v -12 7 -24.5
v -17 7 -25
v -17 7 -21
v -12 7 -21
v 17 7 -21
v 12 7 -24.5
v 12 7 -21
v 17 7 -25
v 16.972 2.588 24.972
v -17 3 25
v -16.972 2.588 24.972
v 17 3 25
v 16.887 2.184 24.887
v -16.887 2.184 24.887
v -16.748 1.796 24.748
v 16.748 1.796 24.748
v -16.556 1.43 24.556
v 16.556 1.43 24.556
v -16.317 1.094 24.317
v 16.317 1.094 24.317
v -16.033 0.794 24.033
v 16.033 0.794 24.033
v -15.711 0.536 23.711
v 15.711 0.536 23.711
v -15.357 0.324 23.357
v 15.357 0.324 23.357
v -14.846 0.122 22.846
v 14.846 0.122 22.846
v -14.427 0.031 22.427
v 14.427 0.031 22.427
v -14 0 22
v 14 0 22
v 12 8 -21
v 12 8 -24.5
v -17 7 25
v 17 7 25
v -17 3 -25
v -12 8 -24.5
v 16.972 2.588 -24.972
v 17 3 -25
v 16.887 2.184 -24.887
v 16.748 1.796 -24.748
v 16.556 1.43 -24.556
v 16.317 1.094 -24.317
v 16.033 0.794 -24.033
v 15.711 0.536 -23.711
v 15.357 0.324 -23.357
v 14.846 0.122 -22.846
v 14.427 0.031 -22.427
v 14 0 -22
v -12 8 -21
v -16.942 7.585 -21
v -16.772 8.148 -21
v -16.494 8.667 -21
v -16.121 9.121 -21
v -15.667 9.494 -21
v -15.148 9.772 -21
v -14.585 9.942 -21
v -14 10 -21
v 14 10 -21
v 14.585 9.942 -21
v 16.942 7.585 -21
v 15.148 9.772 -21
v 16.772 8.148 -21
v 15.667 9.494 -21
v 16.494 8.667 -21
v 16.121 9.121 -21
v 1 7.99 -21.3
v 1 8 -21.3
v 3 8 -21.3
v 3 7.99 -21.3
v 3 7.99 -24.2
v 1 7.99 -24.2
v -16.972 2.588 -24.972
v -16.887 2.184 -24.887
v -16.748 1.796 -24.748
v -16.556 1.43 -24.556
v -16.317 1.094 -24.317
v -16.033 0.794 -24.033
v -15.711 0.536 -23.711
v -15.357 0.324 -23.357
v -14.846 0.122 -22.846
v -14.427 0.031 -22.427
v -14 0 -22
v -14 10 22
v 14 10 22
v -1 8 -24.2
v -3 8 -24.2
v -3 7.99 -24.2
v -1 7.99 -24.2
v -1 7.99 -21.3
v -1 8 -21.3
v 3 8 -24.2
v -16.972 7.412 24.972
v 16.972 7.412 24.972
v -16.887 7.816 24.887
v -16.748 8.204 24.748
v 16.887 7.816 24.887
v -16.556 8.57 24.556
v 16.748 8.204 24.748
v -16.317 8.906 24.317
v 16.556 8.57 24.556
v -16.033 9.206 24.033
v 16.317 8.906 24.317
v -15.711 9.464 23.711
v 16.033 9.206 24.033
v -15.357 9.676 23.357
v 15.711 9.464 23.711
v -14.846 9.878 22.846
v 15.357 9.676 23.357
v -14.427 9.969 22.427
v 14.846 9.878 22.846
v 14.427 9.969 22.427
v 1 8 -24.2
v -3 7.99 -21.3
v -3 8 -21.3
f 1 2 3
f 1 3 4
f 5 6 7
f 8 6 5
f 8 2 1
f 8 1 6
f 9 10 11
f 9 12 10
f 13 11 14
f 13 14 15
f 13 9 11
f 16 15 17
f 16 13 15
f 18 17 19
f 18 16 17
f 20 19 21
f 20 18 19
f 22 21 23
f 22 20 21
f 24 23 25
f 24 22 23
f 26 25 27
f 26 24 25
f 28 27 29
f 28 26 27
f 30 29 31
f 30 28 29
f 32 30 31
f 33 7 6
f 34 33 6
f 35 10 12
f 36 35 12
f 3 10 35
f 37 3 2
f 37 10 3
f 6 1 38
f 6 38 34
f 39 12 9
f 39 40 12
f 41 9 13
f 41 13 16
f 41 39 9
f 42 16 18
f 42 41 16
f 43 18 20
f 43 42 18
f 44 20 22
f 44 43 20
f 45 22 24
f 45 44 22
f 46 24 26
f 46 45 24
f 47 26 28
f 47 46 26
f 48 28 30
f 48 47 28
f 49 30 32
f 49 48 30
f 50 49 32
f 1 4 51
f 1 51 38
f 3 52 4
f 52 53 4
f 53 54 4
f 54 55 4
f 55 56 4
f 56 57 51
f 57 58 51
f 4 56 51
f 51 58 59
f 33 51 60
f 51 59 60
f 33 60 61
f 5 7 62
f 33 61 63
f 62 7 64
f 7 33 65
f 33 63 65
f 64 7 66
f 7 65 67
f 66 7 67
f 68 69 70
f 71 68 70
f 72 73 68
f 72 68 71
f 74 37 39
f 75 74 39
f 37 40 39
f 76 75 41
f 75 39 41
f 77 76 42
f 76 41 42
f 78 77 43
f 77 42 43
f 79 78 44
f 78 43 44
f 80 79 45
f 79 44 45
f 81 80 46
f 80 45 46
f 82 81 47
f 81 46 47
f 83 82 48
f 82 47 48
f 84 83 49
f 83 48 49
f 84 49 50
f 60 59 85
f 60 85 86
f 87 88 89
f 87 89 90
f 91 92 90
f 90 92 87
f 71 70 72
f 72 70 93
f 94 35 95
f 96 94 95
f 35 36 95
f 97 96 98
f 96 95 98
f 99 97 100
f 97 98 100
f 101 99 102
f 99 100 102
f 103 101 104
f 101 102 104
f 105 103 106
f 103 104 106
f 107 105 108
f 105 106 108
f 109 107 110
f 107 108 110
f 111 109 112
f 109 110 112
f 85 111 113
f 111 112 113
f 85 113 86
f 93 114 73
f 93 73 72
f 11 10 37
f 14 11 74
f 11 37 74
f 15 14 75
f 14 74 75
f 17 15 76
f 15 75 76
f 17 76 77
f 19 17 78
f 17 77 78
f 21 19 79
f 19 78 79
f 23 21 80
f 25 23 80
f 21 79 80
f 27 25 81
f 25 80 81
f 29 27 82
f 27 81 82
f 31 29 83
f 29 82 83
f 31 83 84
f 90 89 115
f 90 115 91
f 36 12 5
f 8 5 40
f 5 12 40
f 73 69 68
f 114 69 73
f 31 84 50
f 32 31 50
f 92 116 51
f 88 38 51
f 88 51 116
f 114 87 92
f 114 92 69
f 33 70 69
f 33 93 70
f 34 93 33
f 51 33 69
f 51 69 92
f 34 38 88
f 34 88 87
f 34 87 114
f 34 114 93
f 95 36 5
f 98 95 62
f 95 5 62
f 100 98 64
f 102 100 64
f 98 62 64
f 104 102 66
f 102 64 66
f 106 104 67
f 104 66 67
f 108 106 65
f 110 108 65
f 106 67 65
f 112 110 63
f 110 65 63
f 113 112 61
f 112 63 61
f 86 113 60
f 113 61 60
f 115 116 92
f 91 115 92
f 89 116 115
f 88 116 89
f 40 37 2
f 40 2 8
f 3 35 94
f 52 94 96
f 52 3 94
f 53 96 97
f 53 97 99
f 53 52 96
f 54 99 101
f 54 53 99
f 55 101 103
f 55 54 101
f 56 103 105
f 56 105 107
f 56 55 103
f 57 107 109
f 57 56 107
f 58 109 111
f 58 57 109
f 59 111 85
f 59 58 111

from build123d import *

# Parameters (mm, degrees)
SKETCH_1_W          = 34
SKETCH_1_H          = 50
EXTRUDE_1_DEPTH     = 10
FILLET_1_R          = 3
SKETCH_2_W          = 36
SKETCH_2_H          = 5
CUT_EXTRUDE_1_DEPTH = 3
SKETCH_3_W          = 24
SKETCH_3_H          = 3.5
EXTRUDE_2_DEPTH     = 1
SKETCH_4_W          = 2
SKETCH_4_H          = 2.9
CUT_EXTRUDE_2_DEPTH = 0.01


with BuildPart() as part:
    # Эскиз1 → Бобышка-Вытянуть1 (new body)
    with BuildSketch(Plane(origin=(0, 0, 0), x_dir=(1, 0, 0), z_dir=(0, 1, 0))):
        Rectangle(SKETCH_1_W, SKETCH_1_H)
    extrude(amount=EXTRUDE_1_DEPTH)

    # Скругление1
    fillet_1_edges = [part.edges().sort_by_distance(p)[0] for p in [
        (17, 10, 0),
        (-17, 10, 0),
        (0, 0, -25),
        (17, 0, 0),
        (0, 0, 25),
        (-17, 0, 0),
        (0, 10, 25),
    ]]
    fillet(fillet_1_edges, radius=FILLET_1_R)

    # Эскиз2 → Вырез-Вытянуть1 (cut)
    with BuildSketch(Plane(origin=(0, 10, 0), x_dir=(1, 0, 0), z_dir=(0, 1, 0))):
        with Locations((0, 23.5)):
            Rectangle(SKETCH_2_W, SKETCH_2_H)
    extrude(amount=-CUT_EXTRUDE_1_DEPTH, mode=Mode.SUBTRACT)

    # Эскиз3 → Бобышка-Вытянуть2 (add)
    with BuildSketch(Plane(origin=(0, 7, 0), x_dir=(1, 0, 0), z_dir=(0, 1, 0))):
        with Locations((0, 22.75)):
            Rectangle(SKETCH_3_W, SKETCH_3_H)
    extrude(amount=EXTRUDE_2_DEPTH)

    # Эскиз4 → Вырез-Вытянуть2 (cut)
    with BuildSketch(Plane(origin=(0, 8, 0), x_dir=(1, 0, 0), z_dir=(0, 1, 0))):
        with Locations((-2, 22.75)):
            Rectangle(SKETCH_4_W, SKETCH_4_H)
        with Locations((2, 22.75)):
            Rectangle(SKETCH_4_W, SKETCH_4_H)
    extrude(amount=-CUT_EXTRUDE_2_DEPTH, mode=Mode.SUBTRACT)


solid = part.part
